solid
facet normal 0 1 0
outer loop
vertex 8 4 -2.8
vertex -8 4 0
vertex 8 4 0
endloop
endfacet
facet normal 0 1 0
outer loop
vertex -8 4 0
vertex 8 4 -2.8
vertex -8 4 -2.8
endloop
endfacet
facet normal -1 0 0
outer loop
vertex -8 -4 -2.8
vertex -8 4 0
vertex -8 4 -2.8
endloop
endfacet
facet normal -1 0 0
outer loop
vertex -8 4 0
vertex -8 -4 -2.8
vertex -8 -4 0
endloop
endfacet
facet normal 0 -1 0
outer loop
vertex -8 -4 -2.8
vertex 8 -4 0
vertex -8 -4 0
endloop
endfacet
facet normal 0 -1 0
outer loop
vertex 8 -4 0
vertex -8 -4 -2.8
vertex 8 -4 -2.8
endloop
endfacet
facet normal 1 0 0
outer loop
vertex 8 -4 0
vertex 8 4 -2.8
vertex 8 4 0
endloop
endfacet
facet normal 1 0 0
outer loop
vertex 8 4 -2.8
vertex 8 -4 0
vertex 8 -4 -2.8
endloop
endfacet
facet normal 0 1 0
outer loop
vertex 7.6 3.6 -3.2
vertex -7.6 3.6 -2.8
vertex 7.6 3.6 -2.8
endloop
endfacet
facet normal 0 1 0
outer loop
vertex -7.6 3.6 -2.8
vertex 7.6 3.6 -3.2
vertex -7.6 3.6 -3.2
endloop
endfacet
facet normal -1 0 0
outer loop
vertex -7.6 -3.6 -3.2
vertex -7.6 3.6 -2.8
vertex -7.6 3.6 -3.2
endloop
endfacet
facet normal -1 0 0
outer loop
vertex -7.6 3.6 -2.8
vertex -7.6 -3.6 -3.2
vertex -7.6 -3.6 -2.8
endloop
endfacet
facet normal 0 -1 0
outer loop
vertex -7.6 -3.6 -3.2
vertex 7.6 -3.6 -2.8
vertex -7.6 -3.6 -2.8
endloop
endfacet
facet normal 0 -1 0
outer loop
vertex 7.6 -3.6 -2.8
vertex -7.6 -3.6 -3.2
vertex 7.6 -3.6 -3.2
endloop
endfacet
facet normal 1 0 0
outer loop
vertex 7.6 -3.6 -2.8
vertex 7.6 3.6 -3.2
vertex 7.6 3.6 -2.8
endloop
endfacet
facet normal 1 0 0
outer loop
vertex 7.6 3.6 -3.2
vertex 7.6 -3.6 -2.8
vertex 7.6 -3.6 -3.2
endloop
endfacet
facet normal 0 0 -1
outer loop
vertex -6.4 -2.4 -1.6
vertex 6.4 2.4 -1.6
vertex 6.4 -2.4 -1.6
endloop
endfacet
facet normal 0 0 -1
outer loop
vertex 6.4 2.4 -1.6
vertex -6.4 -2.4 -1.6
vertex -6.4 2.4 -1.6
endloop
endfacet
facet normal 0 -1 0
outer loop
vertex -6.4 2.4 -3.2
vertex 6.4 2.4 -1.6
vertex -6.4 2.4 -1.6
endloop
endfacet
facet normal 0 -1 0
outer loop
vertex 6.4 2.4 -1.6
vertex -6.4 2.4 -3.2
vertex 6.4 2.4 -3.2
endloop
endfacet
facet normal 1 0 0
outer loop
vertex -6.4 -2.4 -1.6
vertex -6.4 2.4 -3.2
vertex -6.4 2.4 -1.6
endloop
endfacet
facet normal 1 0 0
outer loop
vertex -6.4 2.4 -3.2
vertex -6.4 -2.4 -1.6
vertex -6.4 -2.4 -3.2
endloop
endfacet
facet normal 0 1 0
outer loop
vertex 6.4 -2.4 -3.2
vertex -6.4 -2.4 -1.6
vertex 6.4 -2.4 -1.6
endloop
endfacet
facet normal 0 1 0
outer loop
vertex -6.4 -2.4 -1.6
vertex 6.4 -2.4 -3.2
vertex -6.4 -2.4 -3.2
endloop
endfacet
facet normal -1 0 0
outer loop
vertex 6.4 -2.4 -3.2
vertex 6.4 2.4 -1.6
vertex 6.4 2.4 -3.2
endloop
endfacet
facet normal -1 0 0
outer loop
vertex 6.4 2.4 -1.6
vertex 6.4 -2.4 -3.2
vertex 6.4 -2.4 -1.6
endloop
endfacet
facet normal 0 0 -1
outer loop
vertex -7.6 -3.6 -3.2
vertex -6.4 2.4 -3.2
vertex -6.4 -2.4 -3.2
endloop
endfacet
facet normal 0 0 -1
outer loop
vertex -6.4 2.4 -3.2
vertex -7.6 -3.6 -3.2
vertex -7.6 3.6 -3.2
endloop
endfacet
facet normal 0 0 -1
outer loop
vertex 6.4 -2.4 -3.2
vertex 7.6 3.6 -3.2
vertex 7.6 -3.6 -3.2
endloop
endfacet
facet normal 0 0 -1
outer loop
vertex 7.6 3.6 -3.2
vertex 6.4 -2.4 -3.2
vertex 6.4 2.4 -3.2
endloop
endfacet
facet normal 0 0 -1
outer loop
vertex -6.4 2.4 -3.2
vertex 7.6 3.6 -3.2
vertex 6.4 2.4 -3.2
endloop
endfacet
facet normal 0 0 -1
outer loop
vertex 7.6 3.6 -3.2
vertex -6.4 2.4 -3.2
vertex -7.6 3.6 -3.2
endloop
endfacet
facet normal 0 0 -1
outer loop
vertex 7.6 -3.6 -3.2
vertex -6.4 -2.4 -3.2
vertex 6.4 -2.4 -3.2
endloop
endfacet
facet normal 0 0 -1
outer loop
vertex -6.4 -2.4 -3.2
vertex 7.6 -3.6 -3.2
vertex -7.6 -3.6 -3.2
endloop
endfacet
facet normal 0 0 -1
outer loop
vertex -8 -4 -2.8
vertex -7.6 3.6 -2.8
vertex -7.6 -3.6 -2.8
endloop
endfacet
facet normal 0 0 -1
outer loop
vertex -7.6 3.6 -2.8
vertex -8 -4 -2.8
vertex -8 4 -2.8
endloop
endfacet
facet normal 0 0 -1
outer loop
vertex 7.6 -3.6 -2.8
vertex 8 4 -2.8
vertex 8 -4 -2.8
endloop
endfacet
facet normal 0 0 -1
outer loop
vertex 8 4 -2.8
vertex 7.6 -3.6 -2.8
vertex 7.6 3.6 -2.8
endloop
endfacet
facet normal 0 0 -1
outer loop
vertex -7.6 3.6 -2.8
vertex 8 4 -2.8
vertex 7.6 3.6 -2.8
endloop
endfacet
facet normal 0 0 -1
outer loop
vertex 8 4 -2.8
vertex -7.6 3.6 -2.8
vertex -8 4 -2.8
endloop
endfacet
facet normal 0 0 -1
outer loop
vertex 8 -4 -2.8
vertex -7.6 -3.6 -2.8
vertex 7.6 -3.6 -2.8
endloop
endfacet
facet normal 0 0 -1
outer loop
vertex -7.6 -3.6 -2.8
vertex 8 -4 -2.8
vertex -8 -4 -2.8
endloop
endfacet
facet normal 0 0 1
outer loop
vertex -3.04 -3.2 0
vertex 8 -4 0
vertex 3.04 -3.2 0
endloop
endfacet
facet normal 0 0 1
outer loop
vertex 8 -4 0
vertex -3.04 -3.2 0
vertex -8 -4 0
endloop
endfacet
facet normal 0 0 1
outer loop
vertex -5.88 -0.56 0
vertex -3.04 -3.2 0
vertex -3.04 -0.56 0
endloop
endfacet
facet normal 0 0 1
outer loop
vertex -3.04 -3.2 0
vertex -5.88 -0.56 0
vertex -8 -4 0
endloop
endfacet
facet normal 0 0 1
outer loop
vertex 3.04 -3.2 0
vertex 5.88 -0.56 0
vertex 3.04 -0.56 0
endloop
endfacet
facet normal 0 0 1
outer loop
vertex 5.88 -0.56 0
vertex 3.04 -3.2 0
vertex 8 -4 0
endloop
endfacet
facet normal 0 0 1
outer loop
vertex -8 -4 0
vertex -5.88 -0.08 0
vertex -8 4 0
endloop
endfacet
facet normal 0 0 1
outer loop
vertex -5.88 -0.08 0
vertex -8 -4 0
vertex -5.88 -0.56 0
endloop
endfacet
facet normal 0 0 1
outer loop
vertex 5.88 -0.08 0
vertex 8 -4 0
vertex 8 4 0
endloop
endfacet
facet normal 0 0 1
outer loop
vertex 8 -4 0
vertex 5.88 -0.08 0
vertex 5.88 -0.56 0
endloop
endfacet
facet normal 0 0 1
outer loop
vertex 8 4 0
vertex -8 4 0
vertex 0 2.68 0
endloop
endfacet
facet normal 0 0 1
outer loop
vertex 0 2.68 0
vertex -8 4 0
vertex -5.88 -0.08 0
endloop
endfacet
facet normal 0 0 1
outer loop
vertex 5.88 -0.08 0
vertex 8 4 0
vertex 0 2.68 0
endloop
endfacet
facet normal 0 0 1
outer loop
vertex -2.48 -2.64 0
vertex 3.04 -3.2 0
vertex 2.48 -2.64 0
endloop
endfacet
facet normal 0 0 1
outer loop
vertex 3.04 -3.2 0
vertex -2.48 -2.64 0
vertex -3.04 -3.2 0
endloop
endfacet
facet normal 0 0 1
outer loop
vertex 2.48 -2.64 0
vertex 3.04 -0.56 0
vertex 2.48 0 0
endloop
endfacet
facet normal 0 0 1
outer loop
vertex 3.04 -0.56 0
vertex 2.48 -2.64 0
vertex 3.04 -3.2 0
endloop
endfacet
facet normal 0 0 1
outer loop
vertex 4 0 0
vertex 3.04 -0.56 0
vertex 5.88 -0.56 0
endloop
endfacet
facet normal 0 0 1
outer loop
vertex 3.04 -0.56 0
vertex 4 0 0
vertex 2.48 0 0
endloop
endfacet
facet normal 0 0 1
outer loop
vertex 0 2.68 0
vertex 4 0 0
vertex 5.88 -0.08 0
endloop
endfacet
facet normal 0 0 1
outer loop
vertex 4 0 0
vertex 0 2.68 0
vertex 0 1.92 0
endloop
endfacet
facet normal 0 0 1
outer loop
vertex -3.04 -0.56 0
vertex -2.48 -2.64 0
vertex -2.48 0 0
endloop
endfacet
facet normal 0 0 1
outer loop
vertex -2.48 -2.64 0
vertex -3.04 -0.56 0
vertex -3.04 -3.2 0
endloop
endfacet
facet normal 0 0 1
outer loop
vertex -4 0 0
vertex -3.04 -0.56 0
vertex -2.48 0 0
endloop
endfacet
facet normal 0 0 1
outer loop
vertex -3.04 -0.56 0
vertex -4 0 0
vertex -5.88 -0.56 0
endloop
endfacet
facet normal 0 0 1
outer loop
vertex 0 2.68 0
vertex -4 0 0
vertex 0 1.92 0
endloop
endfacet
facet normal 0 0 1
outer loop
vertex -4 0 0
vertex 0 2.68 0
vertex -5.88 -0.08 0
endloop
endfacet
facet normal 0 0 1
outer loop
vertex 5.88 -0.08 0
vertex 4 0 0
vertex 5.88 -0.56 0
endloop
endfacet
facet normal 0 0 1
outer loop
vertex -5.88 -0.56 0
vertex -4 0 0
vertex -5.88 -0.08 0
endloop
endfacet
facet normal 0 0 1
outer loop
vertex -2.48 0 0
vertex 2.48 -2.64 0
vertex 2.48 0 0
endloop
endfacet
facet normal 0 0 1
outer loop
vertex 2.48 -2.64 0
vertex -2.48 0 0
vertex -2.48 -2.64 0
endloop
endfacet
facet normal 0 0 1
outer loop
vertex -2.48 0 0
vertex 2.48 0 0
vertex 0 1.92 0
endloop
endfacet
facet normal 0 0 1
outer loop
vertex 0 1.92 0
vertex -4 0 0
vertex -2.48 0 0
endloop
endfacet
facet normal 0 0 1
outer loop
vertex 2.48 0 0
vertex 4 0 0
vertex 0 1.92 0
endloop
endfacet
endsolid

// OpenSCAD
// file: ../p/box5.scad
use <../lib.scad>
function ldraw_lib__box5() = [
// 0 Box with 5 Faces and All Edges
// 0 Name: box5.dat
// 0 Author: James Jessiman
// 0 !LDRAW_ORG Primitive UPDATE 2012-01
// 0 !LICENSE Licensed under CC BY 2.0 and CC BY 4.0 : see CAreadme.txt
// 
// 0 BFC CERTIFY CCW
  [0,"BFC","CERTIFY"],
  [0,"BFC","CCW"],
// 
// 0 !HISTORY 2002-04-03 [sbliss] Modified for BFC compliance
// 0 !HISTORY 2002-04-25 [PTadmin] Official Update 2002-02
// 0 !HISTORY 2007-06-24 [PTadmin] Header formatted for Contributor Agreement
// 0 !HISTORY 2008-07-01 [PTadmin] Official Update 2008-01
// 0 !HISTORY 2012-02-16 [Philo] Changed to CCW
// 0 !HISTORY 2012-03-30 [PTadmin] Official Update 2012-01
// 
// 
// 2 24 1 1 1 -1 1 1
  [2,24,1,1,1,-1,1,1],
// 2 24 -1 1 1 -1 1 -1
  [2,24,-1,1,1,-1,1,-1],
// 2 24 -1 1 -1 1 1 -1
  [2,24,-1,1,-1,1,1,-1],
// 2 24 1 1 -1 1 1 1
  [2,24,1,1,-1,1,1,1],
// 2 24 1 0 1 -1 0 1
  [2,24,1,0,1,-1,0,1],
// 2 24 -1 0 1 -1 0 -1
  [2,24,-1,0,1,-1,0,-1],
// 2 24 -1 0 -1 1 0 -1
  [2,24,-1,0,-1,1,0,-1],
// 2 24 1 0 -1 1 0 1
  [2,24,1,0,-1,1,0,1],
// 2 24 1 0 1 1 1 1
  [2,24,1,0,1,1,1,1],
// 2 24 -1 0 1 -1 1 1
  [2,24,-1,0,1,-1,1,1],
// 2 24 1 0 -1 1 1 -1
  [2,24,1,0,-1,1,1,-1],
// 2 24 -1 0 -1 -1 1 -1
  [2,24,-1,0,-1,-1,1,-1],
// 4 16 -1 1 1 1 1 1 1 1 -1 -1 1 -1
  [4,16,-1,1,1,1,1,1,1,1,-1,-1,1,-1],
// 4 16 -1 1 1 -1 0 1 1 0 1 1 1 1
  [4,16,-1,1,1,-1,0,1,1,0,1,1,1,1],
// 4 16 -1 1 -1 -1 0 -1 -1 0 1 -1 1 1
  [4,16,-1,1,-1,-1,0,-1,-1,0,1,-1,1,1],
// 4 16 1 1 -1 1 0 -1 -1 0 -1 -1 1 -1
  [4,16,1,1,-1,1,0,-1,-1,0,-1,-1,1,-1],
// 4 16 1 1 1 1 0 1 1 0 -1 1 1 -1
  [4,16,1,1,1,1,0,1,1,0,-1,1,1,-1],
];
module ldraw_lib__box5(step=0, col=false, unit=2/5, alt=false, line=0.2, solid=!$preview)
    makepoly(ldraw_lib__box5(), step=step, col=col, unit=unit, alt=alt, line=line, solid=solid);
ldraw_lib__box5(line=0.2);
// file: ../p/box4.scad
use <../lib.scad>
function ldraw_lib__box4() = [
// 0 Box with 4 Faces (2 Parallel Pairs) and All Edges
// 0 Name: box4.dat
// 0 Author: James Jessiman
// 0 !LDRAW_ORG Primitive UPDATE 2012-01
// 0 !LICENSE Licensed under CC BY 2.0 and CC BY 4.0 : see CAreadme.txt
// 
// 0 BFC CERTIFY CCW
  [0,"BFC","CERTIFY"],
  [0,"BFC","CCW"],
// 
// 0 !HISTORY 2002-04-03 [sbliss] Modified for BFC compliance
// 0 !HISTORY 2002-04-25 [PTadmin] Official Update 2002-02
// 0 !HISTORY 2007-06-24 [PTadmin] Header formatted for Contributor Agreement
// 0 !HISTORY 2008-07-01 [PTadmin] Official Update 2008-01
// 0 !HISTORY 2012-02-16 [Philo] Changed to CCW
// 0 !HISTORY 2012-03-30 [PTadmin] Official Update 2012-01
// 
// 
// 2 24 1 1 1 -1 1 1
  [2,24,1,1,1,-1,1,1],
// 2 24 -1 1 1 -1 1 -1
  [2,24,-1,1,1,-1,1,-1],
// 2 24 -1 1 -1 1 1 -1
  [2,24,-1,1,-1,1,1,-1],
// 2 24 1 1 -1 1 1 1
  [2,24,1,1,-1,1,1,1],
// 2 24 1 0 1 -1 0 1
  [2,24,1,0,1,-1,0,1],
// 2 24 -1 0 1 -1 0 -1
  [2,24,-1,0,1,-1,0,-1],
// 2 24 -1 0 -1 1 0 -1
  [2,24,-1,0,-1,1,0,-1],
// 2 24 1 0 -1 1 0 1
  [2,24,1,0,-1,1,0,1],
// 2 24 1 0 1 1 1 1
  [2,24,1,0,1,1,1,1],
// 2 24 -1 0 1 -1 1 1
  [2,24,-1,0,1,-1,1,1],
// 2 24 1 0 -1 1 1 -1
  [2,24,1,0,-1,1,1,-1],
// 2 24 -1 0 -1 -1 1 -1
  [2,24,-1,0,-1,-1,1,-1],
// 4 16 -1 1 1 -1 0 1 1 0 1 1 1 1
  [4,16,-1,1,1,-1,0,1,1,0,1,1,1,1],
// 4 16 -1 1 -1 -1 0 -1 -1 0 1 -1 1 1
  [4,16,-1,1,-1,-1,0,-1,-1,0,1,-1,1,1],
// 4 16 1 1 -1 1 0 -1 -1 0 -1 -1 1 -1
  [4,16,1,1,-1,1,0,-1,-1,0,-1,-1,1,-1],
// 4 16 1 1 1 1 0 1 1 0 -1 1 1 -1
  [4,16,1,1,1,1,0,1,1,0,-1,1,1,-1],
];
module ldraw_lib__box4(step=0, col=false, unit=2/5, alt=false, line=0.2, solid=!$preview)
    makepoly(ldraw_lib__box4(), step=step, col=col, unit=unit, alt=alt, line=line, solid=solid);
ldraw_lib__box4(line=0.2);
// file: s/3069p13c.scad
use <../../lib.scad>
function ldraw_lib__s__3069p13c() = [
// 0 ~Tile  1 x  2 with Arrow Short Pattern - Arrow
// 0 Name: s\3069p13c.dat
// 0 Author: Alex Taylor [anathema]
// 0 !LDRAW_ORG Subpart UPDATE 2010-02
// 0 !LICENSE Licensed under CC BY 2.0 and CC BY 4.0 : see CAreadme.txt
// 
// 0 BFC CERTIFY CCW
  [0,"BFC","CERTIFY"],
  [0,"BFC","CCW"],
// 
// 0 !HISTORY 2010-07-05 [PTadmin] Official Update 2010-02
// 
// 
// 4 16 -6.2 0 -6.6 6.2 0 -6.6 6.2 0 0 -6.2 0 0
  [4,16,-6.2,0,-6.6,6.2,0,-6.6,6.2,0,0,-6.2,0,0],
// 3 16 -6.2 0 0 6.2 0 0 0 0 4.8
  [3,16,-6.2,0,0,6.2,0,0,0,0,4.8],
// 3 16 0 0 4.8 -10 0 0 -6.2 0 0
  [3,16,0,0,4.8,-10,0,0,-6.2,0,0],
// 3 16 6.2 0 0 10 0 0 0 0 4.8
  [3,16,6.2,0,0,10,0,0,0,0,4.8],
// 0
];
module ldraw_lib__s__3069p13c(step=0, col=false, unit=2/5, alt=false, line=0.2, solid=!$preview)
    makepoly(ldraw_lib__s__3069p13c(), step=step, col=col, unit=unit, alt=alt, line=line, solid=solid);
ldraw_lib__s__3069p13c(line=0.2);
// file: s/3069p13b.scad
use <../../lib.scad>
function ldraw_lib__s__3069p13b() = [
// 0 ~Tile  1 x  2 with Arrow Short Pattern - Border
// 0 Name: s\3069p13b.dat
// 0 Author: Alex Taylor [anathema]
// 0 !LDRAW_ORG Subpart UPDATE 2010-02
// 0 !LICENSE Licensed under CC BY 2.0 and CC BY 4.0 : see CAreadme.txt
// 
// 0 BFC CERTIFY CCW
  [0,"BFC","CERTIFY"],
  [0,"BFC","CCW"],
// 
// 0 !HISTORY 2010-07-05 [PTadmin] Official Update 2010-02
// 
// 
// 4 16 -7.6 0 -8 7.6 0 -8 6.2 0 -6.6 -6.2 0 -6.6
  [4,16,-7.6,0,-8,7.6,0,-8,6.2,0,-6.6,-6.2,0,-6.6],
// 4 16 6.2 0 0 6.2 0 -6.6 7.6 0 -8 7.6 0 -1.4
  [4,16,6.2,0,0,6.2,0,-6.6,7.6,0,-8,7.6,0,-1.4],
// 4 16 7.6 0 -1.4 14.7 0 -1.4 10 0 0 6.2 0 0
  [4,16,7.6,0,-1.4,14.7,0,-1.4,10,0,0,6.2,0,0],
// 4 16 0 0 4.8 10 0 0 14.7 0 -0.2 0 0 6.7
  [4,16,0,0,4.8,10,0,0,14.7,0,-0.2,0,0,6.7],
// 4 16 -7.6 0 -1.4 -7.6 0 -8 -6.2 0 -6.6 -6.2 0 0
  [4,16,-7.6,0,-1.4,-7.6,0,-8,-6.2,0,-6.6,-6.2,0,0],
// 4 16 -6.2 0 0 -10 0 0 -14.7 0 -1.4 -7.6 0 -1.4
  [4,16,-6.2,0,0,-10,0,0,-14.7,0,-1.4,-7.6,0,-1.4],
// 4 16 0 0 6.7 -14.7 0 -0.2 -10 0 0 0 0 4.8
  [4,16,0,0,6.7,-14.7,0,-0.2,-10,0,0,0,0,4.8],
// 3 16 14.7 0 -0.2 10 0 0 14.7 0 -1.4
  [3,16,14.7,0,-0.2,10,0,0,14.7,0,-1.4],
// 3 16 -14.7 0 -1.4 -10 0 0 -14.7 0 -0.2
  [3,16,-14.7,0,-1.4,-10,0,0,-14.7,0,-0.2],
// 0
];
module ldraw_lib__s__3069p13b(step=0, col=false, unit=2/5, alt=false, line=0.2, solid=!$preview)
    makepoly(ldraw_lib__s__3069p13b(), step=step, col=col, unit=unit, alt=alt, line=line, solid=solid);
ldraw_lib__s__3069p13b(line=0.2);
// file: s/3069p13a.scad
use <../../lib.scad>
function ldraw_lib__s__3069p13a() = [
// 0 ~Tile  1 x  2 with Arrow Short Pattern - Mask
// 0 Name: s\3069p13a.dat
// 0 Author: Alex Taylor [anathema]
// 0 !LDRAW_ORG Subpart UPDATE 2010-02
// 0 !LICENSE Licensed under CC BY 2.0 and CC BY 4.0 : see CAreadme.txt
// 
// 0 BFC CERTIFY CCW
  [0,"BFC","CERTIFY"],
  [0,"BFC","CCW"],
// 
// 0 !HISTORY 2010-07-05 [PTadmin] Official Update 2010-02
// 
// 
// 4 16 -20 0 -10 20 0 -10 7.6 0 -8 -7.6 0 -8
  [4,16,-20,0,-10,20,0,-10,7.6,0,-8,-7.6,0,-8],
// 4 16 -7.6 0 -8 -7.6 0 -1.4 -14.7 0 -1.4 -20 0 -10
  [4,16,-7.6,0,-8,-7.6,0,-1.4,-14.7,0,-1.4,-20,0,-10],
// 4 16 20 0 -10 14.7 0 -1.4 7.6 0 -1.4 7.6 0 -8
  [4,16,20,0,-10,14.7,0,-1.4,7.6,0,-1.4,7.6,0,-8],
// 4 16 -20 0 -10 -14.7 0 -1.4 -14.7 0 -0.2 -20 0 10
  [4,16,-20,0,-10,-14.7,0,-1.4,-14.7,0,-0.2,-20,0,10],
// 4 16 20 0 10 14.7 0 -0.2 14.7 0 -1.4 20 0 -10
  [4,16,20,0,10,14.7,0,-0.2,14.7,0,-1.4,20,0,-10],
// 3 16 20 0 10 -20 0 10 0 0 6.7
  [3,16,20,0,10,-20,0,10,0,0,6.7],
// 3 16 0 0 6.7 -20 0 10 -14.7 0 -0.2
  [3,16,0,0,6.7,-20,0,10,-14.7,0,-0.2],
// 3 16 14.7 0 -0.2 20 0 10 0 0 6.7
  [3,16,14.7,0,-0.2,20,0,10,0,0,6.7],
// 0
];
module ldraw_lib__s__3069p13a(step=0, col=false, unit=2/5, alt=false, line=0.2, solid=!$preview)
    makepoly(ldraw_lib__s__3069p13a(), step=step, col=col, unit=unit, alt=alt, line=line, solid=solid);
ldraw_lib__s__3069p13a(line=0.2);
// file: s/3069bs01.scad
use <../../lib.scad>
use <../../p/box4.scad>
use <../../p/box5.scad>
function ldraw_lib__s__3069bs01() = [
// 0 ~Tile  1 x  2 with Groove without Top Face
// 0 Name: s\3069bs01.dat
// 0 Author: Santeri Piippo [arezey]
// 0 !LDRAW_ORG Subpart UPDATE 2010-02
// 0 !LICENSE Licensed under CC BY 2.0 and CC BY 4.0 : see CAreadme.txt
// 
// 0 BFC CERTIFY CCW
  [0,"BFC","CERTIFY"],
  [0,"BFC","CCW"],
// 
// 0 !HISTORY 2010-07-05 [PTadmin] Official Update 2010-02
// 
// 
// 1 16 0 0 0 20 0 0 0 7 0 0 0 10 box4.dat
  [1,16,0,0,0,20,0,0,0,7,0,0,0,10, ldraw_lib__box4()],
// 1 16 0 7 0 19 0 0 0 1 0 0 0 9 box4.dat
  [1,16,0,7,0,19,0,0,0,1,0,0,0,9, ldraw_lib__box4()],
// 0 BFC INVERTNEXT
  [0,"BFC","INVERTNEXT"],
// 1 16 0 8 0 16 0 0 0 -4 0 0 0 6 box5.dat
  [1,16,0,8,0,16,0,0,0,-4,0,0,0,6, ldraw_lib__box5()],
// 4 16 -19 8 9 -16 8 6 -16 8 -6 -19 8 -9
  [4,16,-19,8,9,-16,8,6,-16,8,-6,-19,8,-9],
// 4 16 19 8 -9 16 8 -6 16 8 6 19 8 9
  [4,16,19,8,-9,16,8,-6,16,8,6,19,8,9],
// 4 16 19 8 9 16 8 6 -16 8 6 -19 8 9
  [4,16,19,8,9,16,8,6,-16,8,6,-19,8,9],
// 4 16 -19 8 -9 -16 8 -6 16 8 -6 19 8 -9
  [4,16,-19,8,-9,-16,8,-6,16,8,-6,19,8,-9],
// 4 16 -20 7 10 -19 7 9 -19 7 -9 -20 7 -10
  [4,16,-20,7,10,-19,7,9,-19,7,-9,-20,7,-10],
// 4 16 20 7 -10 19 7 -9 19 7 9 20 7 10
  [4,16,20,7,-10,19,7,-9,19,7,9,20,7,10],
// 4 16 20 7 10 19 7 9 -19 7 9 -20 7 10
  [4,16,20,7,10,19,7,9,-19,7,9,-20,7,10],
// 4 16 -20 7 -10 -19 7 -9 19 7 -9 20 7 -10
  [4,16,-20,7,-10,-19,7,-9,19,7,-9,20,7,-10],
// 0 //
];
module ldraw_lib__s__3069bs01(step=0, col=false, unit=2/5, alt=false, line=0.2, solid=!$preview)
    makepoly(ldraw_lib__s__3069bs01(), step=step, col=col, unit=unit, alt=alt, line=line, solid=solid);
ldraw_lib__s__3069bs01(line=0.2);
// main file
use <../lib.scad>
use <s/3069bs01.scad>
use <s/3069p13a.scad>
use <s/3069p13b.scad>
use <s/3069p13c.scad>
function ldraw_lib__3069bp21() = [
// 0 Tile  1 x  2 with Arrow Short Yellow Pattern
// 0 Name: 3069bp21.dat
// 0 Author: James Jessiman
// 0 !LDRAW_ORG Part UPDATE 2010-02
// 0 !LICENSE Licensed under CC BY 2.0 and CC BY 4.0 : see CAreadme.txt
// 
// 0 BFC CERTIFY CCW
  [0,"BFC","CERTIFY"],
  [0,"BFC","CCW"],
// 
// 0 !HISTORY 2002-02-18 [PTadmin] Official Update 2002-01
// 0 !HISTORY 2003-06-08 [jriley] BFC compliant
// 0 !HISTORY 2003-12-19 [PTadmin] Official Update 2003-03
// 0 !HISTORY 2007-06-13 [PTadmin] Header formatted for Contributor Agreement
// 0 !HISTORY 2008-07-01 [PTadmin] Official Update 2008-01
// 0 !HISTORY 2009-08-15 [anathema] Rebuilt using new subparts
// 0 !HISTORY 2010-07-05 [PTadmin] Official Update 2010-02
// 
// 
// 1 16 0 0 0 1 0 0 0 1 0 0 0 1 s\3069bs01.dat
  [1,16,0,0,0,1,0,0,0,1,0,0,0,1, ldraw_lib__s__3069bs01()],
// 1 16 0 0 0 1 0 0 0 1 0 0 0 1 s\3069p13a.dat
  [1,16,0,0,0,1,0,0,0,1,0,0,0,1, ldraw_lib__s__3069p13a()],
// 1 16 0 0 0 1 0 0 0 1 0 0 0 1 s\3069p13b.dat
  [1,16,0,0,0,1,0,0,0,1,0,0,0,1, ldraw_lib__s__3069p13b()],
// 1 14 0 0 0 1 0 0 0 1 0 0 0 1 s\3069p13c.dat
  [1,14,0,0,0,1,0,0,0,1,0,0,0,1, ldraw_lib__s__3069p13c()],
// 0
];
module ldraw_lib__3069bp21(step=0, col=false, unit=2/5, alt=false, line=0.2, solid=!$preview)
    makepoly(ldraw_lib__3069bp21(), step=step, col=col, unit=unit, alt=alt, line=line, solid=solid);
ldraw_lib__3069bp21(line=0.2);
